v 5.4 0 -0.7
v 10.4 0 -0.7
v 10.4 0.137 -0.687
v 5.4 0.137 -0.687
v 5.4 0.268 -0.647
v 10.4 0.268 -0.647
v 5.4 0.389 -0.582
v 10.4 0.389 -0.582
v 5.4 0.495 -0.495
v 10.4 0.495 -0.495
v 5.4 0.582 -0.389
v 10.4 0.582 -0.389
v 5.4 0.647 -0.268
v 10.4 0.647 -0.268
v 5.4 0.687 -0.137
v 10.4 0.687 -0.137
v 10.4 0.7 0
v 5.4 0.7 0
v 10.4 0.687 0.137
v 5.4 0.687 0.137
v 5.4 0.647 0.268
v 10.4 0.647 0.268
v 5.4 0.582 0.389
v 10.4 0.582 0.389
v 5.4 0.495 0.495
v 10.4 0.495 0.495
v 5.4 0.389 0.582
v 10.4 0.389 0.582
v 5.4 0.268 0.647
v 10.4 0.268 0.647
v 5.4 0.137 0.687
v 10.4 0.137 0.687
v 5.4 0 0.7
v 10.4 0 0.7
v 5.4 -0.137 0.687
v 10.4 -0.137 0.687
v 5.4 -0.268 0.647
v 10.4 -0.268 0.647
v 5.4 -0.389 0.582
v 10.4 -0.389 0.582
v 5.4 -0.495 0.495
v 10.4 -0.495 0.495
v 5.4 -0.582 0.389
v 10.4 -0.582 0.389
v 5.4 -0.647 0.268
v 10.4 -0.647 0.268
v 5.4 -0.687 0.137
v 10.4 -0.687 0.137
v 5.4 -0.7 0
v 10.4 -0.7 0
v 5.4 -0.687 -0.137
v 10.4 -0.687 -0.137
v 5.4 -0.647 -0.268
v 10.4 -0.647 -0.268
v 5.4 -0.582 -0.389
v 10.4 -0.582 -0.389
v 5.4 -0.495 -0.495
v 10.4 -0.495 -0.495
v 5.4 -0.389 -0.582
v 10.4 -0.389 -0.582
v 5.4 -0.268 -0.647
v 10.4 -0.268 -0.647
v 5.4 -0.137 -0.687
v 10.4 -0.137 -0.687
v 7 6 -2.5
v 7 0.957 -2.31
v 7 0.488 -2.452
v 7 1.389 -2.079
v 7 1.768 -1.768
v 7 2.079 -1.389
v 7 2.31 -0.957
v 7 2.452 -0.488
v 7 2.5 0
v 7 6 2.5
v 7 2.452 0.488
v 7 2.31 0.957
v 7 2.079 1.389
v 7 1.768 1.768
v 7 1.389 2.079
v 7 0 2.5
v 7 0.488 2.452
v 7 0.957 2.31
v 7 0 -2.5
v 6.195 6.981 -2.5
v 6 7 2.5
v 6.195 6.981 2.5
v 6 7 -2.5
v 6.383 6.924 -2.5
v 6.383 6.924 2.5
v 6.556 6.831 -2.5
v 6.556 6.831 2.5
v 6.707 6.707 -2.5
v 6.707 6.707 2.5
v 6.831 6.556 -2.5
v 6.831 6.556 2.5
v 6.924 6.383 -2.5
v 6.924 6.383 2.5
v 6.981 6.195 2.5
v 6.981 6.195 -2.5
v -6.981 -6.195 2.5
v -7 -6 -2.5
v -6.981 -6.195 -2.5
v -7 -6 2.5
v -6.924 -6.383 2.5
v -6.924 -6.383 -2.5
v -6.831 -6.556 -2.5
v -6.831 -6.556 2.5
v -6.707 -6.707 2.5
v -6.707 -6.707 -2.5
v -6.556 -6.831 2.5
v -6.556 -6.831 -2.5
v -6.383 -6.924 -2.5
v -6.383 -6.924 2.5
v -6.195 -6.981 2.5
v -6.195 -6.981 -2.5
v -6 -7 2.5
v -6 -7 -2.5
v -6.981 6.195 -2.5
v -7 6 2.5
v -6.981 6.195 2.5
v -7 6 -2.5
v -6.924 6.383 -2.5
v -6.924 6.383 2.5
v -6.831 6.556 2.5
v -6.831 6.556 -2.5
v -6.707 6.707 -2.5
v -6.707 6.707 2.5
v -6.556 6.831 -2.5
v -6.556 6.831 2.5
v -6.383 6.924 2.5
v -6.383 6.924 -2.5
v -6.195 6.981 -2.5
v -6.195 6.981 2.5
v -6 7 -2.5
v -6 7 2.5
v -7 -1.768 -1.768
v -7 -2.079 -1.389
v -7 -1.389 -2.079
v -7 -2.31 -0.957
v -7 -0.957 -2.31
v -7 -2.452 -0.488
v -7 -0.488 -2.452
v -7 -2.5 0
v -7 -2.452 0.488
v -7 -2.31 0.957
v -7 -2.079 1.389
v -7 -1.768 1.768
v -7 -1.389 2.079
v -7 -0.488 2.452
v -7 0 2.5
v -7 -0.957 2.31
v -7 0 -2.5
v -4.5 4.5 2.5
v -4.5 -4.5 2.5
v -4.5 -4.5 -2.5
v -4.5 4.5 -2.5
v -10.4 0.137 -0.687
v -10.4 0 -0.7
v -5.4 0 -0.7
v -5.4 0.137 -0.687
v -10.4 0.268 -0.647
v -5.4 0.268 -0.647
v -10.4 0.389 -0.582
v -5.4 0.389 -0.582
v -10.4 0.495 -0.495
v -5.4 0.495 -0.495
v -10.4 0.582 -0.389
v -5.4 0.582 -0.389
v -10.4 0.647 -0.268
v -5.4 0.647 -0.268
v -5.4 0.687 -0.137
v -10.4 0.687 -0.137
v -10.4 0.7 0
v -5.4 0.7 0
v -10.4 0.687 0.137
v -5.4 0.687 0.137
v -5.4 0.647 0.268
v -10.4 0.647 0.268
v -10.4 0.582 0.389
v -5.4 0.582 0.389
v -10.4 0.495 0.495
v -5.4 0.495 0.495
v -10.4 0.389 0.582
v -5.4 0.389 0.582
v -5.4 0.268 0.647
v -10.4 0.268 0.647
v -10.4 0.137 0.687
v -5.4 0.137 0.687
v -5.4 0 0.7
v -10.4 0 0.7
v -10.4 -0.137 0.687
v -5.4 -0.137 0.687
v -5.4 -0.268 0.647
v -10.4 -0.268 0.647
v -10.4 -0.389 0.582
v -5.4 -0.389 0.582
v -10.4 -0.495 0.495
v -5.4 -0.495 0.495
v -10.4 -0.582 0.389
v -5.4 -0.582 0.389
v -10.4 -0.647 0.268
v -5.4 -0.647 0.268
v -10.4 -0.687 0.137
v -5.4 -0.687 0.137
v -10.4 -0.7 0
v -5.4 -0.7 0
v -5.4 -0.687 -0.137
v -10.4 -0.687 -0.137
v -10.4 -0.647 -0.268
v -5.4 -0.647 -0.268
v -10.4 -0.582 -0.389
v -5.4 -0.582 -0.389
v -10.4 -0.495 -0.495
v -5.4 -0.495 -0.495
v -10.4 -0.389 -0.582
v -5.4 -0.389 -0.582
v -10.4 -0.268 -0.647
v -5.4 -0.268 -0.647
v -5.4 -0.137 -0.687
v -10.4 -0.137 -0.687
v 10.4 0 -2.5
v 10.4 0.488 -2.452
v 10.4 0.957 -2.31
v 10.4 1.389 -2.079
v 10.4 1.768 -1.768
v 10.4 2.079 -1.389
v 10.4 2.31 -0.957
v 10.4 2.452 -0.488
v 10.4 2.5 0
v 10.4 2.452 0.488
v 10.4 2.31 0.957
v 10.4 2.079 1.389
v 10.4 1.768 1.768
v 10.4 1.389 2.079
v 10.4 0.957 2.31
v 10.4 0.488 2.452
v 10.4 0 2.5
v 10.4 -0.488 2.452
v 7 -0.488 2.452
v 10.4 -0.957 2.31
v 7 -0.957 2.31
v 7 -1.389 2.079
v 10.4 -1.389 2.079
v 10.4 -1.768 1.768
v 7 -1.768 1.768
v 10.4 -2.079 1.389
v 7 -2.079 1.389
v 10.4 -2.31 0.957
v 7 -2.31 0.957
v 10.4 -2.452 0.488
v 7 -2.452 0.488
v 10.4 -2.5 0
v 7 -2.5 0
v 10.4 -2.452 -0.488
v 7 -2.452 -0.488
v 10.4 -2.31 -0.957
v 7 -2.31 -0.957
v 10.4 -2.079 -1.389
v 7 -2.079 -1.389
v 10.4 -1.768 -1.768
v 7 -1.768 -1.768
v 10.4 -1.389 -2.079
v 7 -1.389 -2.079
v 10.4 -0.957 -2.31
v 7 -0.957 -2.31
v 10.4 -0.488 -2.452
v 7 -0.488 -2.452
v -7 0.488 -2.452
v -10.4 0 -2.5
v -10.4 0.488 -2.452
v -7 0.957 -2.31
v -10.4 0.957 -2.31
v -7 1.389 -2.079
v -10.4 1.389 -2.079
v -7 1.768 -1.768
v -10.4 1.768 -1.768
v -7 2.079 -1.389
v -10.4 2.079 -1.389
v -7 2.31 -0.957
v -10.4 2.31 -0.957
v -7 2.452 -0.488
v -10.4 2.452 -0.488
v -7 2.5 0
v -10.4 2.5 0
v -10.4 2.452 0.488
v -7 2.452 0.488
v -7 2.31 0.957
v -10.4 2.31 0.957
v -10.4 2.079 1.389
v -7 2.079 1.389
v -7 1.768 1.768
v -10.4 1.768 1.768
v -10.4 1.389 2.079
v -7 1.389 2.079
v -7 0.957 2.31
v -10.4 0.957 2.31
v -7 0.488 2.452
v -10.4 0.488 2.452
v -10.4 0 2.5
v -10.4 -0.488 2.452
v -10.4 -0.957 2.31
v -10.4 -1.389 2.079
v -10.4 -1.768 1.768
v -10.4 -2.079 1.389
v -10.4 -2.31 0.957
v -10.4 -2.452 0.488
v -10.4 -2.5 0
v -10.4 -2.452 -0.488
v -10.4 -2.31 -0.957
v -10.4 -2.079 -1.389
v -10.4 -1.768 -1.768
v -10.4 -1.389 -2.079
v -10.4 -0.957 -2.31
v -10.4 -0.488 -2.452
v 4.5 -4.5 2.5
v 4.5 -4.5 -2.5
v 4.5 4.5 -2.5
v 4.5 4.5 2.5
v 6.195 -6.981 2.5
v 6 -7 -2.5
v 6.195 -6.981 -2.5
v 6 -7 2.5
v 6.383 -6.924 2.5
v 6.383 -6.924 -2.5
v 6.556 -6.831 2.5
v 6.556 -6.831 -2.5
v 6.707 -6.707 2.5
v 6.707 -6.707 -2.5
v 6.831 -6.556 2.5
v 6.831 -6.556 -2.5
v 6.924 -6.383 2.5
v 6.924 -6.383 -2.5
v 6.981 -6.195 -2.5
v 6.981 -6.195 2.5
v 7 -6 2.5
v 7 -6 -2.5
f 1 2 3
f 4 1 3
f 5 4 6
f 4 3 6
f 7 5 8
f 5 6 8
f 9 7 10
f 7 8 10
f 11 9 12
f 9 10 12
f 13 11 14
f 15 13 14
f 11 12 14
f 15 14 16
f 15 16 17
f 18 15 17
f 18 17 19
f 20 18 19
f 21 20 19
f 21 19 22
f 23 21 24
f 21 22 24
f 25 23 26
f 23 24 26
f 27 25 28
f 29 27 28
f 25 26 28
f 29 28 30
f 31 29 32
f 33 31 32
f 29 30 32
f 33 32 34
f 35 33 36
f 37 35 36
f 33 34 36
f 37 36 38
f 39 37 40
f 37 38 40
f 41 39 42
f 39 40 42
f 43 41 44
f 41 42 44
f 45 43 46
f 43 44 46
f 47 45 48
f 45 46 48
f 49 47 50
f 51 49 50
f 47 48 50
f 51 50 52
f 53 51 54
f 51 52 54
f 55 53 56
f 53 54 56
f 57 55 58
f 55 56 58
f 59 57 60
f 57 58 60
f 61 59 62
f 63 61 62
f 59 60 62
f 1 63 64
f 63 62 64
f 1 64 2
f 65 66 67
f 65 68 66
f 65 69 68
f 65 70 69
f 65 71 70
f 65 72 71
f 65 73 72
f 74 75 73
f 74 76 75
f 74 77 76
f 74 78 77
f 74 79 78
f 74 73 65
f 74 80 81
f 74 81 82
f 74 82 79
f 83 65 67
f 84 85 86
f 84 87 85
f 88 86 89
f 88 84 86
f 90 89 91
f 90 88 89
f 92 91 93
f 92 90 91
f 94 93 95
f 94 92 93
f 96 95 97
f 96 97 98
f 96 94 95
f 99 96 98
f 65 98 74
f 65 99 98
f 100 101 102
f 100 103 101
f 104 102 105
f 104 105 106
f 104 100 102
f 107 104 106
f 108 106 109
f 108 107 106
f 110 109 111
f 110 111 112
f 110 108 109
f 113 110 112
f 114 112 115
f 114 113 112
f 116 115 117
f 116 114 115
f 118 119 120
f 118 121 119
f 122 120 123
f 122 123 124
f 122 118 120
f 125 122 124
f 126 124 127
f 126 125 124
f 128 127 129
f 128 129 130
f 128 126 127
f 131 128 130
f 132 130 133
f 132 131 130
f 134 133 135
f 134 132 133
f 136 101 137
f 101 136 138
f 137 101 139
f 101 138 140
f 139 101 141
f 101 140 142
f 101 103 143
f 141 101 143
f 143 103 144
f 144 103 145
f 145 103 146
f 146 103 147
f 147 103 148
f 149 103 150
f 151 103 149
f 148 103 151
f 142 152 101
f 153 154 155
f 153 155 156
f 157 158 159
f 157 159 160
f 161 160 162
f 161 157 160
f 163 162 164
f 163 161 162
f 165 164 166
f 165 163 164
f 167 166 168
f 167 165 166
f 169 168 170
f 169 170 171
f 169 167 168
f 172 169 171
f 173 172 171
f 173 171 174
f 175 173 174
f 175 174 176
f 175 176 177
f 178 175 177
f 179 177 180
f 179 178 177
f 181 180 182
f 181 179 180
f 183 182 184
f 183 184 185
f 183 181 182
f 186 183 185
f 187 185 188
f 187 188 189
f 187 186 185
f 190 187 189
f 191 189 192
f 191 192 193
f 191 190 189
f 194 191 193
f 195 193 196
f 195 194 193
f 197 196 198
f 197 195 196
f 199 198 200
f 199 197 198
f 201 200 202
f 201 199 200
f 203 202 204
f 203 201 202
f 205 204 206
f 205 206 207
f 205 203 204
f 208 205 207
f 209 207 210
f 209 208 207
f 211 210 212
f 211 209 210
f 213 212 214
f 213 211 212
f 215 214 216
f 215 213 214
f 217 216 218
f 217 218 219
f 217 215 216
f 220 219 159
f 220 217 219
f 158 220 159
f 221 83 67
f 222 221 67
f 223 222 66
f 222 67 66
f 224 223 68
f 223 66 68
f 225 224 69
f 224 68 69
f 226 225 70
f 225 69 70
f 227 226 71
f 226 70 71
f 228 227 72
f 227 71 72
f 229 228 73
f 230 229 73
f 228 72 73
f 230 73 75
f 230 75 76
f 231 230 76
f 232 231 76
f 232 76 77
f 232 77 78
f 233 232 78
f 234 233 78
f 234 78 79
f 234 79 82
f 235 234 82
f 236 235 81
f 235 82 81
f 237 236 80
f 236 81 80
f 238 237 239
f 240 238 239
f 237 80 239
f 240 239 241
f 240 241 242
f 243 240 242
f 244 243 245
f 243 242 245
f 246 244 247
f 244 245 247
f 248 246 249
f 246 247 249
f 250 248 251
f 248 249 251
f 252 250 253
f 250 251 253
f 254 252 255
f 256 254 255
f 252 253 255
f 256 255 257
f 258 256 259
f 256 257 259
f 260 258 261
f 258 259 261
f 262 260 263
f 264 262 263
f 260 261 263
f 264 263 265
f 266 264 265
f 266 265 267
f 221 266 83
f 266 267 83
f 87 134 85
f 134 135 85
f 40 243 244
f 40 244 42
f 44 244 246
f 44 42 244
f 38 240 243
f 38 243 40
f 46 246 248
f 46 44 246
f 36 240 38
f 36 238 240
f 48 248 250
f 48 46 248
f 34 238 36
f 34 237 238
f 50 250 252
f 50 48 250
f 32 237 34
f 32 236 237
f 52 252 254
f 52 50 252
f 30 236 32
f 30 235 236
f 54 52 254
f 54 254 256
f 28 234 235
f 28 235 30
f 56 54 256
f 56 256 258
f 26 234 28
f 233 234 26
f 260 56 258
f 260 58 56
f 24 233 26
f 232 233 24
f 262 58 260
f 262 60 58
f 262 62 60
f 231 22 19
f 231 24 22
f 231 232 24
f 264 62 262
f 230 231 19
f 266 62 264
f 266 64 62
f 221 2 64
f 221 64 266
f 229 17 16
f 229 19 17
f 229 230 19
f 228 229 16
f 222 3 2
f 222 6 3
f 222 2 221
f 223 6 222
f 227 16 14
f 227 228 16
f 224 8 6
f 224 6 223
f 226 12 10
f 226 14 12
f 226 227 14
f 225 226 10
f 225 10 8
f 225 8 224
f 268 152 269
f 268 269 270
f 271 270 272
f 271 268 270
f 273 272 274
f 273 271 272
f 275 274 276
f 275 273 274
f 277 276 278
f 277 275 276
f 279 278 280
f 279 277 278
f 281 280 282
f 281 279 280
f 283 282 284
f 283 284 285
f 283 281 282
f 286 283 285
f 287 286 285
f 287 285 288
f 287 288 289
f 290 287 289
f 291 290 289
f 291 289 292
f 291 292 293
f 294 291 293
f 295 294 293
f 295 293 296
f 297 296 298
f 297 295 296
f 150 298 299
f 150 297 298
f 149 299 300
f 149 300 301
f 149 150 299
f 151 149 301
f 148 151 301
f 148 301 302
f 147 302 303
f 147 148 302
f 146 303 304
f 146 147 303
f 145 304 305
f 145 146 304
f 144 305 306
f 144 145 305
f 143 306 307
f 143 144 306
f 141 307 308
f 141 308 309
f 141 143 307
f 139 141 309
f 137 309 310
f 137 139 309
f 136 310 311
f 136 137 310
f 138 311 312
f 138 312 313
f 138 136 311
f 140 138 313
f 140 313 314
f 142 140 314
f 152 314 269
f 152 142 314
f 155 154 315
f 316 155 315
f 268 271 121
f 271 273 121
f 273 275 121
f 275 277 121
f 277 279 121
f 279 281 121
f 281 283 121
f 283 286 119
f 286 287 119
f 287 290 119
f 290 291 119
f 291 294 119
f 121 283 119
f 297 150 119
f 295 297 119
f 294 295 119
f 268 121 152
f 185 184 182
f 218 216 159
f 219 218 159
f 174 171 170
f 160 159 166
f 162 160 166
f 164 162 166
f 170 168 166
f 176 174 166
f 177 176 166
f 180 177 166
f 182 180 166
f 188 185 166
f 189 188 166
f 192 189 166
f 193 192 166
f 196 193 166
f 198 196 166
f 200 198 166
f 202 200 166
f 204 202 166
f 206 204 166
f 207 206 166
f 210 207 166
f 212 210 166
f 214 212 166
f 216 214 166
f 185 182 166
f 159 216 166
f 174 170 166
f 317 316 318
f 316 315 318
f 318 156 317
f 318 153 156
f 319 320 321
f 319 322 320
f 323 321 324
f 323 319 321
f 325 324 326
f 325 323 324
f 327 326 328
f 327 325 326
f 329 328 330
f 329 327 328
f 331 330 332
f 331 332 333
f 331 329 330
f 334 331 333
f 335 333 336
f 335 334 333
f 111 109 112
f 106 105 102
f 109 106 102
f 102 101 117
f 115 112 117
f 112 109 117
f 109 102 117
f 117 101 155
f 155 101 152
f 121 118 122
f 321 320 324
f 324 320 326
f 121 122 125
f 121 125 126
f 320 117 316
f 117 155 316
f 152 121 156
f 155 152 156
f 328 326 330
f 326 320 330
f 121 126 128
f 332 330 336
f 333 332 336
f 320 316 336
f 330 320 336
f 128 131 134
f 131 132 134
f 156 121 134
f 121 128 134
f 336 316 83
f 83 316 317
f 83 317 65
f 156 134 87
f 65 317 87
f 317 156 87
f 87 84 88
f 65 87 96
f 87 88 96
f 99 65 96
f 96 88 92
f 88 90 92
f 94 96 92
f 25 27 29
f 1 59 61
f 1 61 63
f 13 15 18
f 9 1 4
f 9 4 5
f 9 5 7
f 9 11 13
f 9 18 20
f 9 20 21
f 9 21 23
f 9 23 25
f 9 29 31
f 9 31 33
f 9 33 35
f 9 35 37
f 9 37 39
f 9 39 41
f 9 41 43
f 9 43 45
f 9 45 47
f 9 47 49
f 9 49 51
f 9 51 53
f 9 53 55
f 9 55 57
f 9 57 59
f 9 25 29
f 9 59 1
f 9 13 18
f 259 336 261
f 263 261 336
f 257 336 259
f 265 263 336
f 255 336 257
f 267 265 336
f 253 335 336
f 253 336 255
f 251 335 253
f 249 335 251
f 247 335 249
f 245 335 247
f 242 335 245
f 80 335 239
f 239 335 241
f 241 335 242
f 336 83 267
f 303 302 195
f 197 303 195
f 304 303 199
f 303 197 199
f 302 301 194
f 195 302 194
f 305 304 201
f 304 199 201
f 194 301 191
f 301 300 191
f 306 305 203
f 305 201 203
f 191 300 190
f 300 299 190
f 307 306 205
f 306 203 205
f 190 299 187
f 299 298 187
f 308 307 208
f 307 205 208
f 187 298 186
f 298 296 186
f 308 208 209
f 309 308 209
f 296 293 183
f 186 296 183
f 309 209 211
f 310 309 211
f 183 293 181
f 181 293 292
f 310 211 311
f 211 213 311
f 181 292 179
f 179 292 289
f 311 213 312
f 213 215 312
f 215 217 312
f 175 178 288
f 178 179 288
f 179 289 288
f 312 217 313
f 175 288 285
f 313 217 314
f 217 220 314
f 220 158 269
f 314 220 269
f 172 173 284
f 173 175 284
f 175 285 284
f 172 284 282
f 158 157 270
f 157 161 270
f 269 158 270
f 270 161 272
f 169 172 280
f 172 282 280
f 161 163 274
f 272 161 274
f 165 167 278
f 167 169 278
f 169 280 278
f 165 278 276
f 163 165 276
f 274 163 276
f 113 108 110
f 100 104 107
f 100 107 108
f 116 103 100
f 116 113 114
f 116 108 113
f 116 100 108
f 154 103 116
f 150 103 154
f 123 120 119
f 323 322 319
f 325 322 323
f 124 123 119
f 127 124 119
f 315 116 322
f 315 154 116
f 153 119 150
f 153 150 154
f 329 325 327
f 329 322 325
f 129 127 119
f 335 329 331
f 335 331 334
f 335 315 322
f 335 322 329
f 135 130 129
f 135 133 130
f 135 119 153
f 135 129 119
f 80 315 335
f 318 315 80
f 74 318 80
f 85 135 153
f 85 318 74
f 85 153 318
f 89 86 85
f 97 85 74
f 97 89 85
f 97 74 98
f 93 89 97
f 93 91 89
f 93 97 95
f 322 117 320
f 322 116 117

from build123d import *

# Parameters (mm, degrees)
SKETCH1_W           = 14
SKETCH1_H           = 14
SKETCH1_W_2         = 9
SKETCH1_H_2         = 9
BOSS_EXTRUDE1_DEPTH = 2.5
SKETCH3_R           = 2.5
BOSS_EXTRUDE2_DEPTH = 3.4
SKETCH4_R           = 0.7
CUT_EXTRUDE1_DEPTH  = 5
FILLET1_R           = 1


with BuildPart() as part:
    # Sketch1 → Boss-Extrude1 (new body, symmetric)
    with BuildSketch(Plane.XY):
        Rectangle(SKETCH1_W, SKETCH1_H)
        Rectangle(SKETCH1_W_2, SKETCH1_H_2, mode=Mode.SUBTRACT)
    extrude(amount=BOSS_EXTRUDE1_DEPTH, both=True)

    # Sketch3 → Boss-Extrude2 (add)
    with BuildSketch(Plane(origin=(7, 0, 0), x_dir=(0, 0, -1), z_dir=(1, 0, 0))):
        Circle(SKETCH3_R)
    boss_extrude2 = extrude(amount=BOSS_EXTRUDE2_DEPTH)

    # Sketch4 → Cut-Extrude1 (cut)
    with BuildSketch(Plane(origin=(10.4, 0, 0), x_dir=(0, 0, -1), z_dir=(1, 0, 0))):
        Circle(SKETCH4_R)
    cut_extrude1 = extrude(amount=-CUT_EXTRUDE1_DEPTH, mode=Mode.SUBTRACT)

    # Mirror1: Boss-Extrude2, Cut-Extrude1 across plane
    add(boss_extrude2.mirror(Plane(origin=(0, 0, 0), x_dir=(0, 0, 1), z_dir=(1, 0, 0))))
    add(cut_extrude1.mirror(Plane(origin=(0, 0, 0), x_dir=(0, 0, 1), z_dir=(1, 0, 0))), mode=Mode.SUBTRACT)

    # Fillet1
    fillet1_edges = [part.edges().sort_by_distance(p)[0] for p in [
        (-7, 7, 0),
        (7, 7, 0),
        (7, -7, 0),
        (-7, -7, 0),
    ]]
    fillet(fillet1_edges, radius=FILLET1_R)


solid = part.part
